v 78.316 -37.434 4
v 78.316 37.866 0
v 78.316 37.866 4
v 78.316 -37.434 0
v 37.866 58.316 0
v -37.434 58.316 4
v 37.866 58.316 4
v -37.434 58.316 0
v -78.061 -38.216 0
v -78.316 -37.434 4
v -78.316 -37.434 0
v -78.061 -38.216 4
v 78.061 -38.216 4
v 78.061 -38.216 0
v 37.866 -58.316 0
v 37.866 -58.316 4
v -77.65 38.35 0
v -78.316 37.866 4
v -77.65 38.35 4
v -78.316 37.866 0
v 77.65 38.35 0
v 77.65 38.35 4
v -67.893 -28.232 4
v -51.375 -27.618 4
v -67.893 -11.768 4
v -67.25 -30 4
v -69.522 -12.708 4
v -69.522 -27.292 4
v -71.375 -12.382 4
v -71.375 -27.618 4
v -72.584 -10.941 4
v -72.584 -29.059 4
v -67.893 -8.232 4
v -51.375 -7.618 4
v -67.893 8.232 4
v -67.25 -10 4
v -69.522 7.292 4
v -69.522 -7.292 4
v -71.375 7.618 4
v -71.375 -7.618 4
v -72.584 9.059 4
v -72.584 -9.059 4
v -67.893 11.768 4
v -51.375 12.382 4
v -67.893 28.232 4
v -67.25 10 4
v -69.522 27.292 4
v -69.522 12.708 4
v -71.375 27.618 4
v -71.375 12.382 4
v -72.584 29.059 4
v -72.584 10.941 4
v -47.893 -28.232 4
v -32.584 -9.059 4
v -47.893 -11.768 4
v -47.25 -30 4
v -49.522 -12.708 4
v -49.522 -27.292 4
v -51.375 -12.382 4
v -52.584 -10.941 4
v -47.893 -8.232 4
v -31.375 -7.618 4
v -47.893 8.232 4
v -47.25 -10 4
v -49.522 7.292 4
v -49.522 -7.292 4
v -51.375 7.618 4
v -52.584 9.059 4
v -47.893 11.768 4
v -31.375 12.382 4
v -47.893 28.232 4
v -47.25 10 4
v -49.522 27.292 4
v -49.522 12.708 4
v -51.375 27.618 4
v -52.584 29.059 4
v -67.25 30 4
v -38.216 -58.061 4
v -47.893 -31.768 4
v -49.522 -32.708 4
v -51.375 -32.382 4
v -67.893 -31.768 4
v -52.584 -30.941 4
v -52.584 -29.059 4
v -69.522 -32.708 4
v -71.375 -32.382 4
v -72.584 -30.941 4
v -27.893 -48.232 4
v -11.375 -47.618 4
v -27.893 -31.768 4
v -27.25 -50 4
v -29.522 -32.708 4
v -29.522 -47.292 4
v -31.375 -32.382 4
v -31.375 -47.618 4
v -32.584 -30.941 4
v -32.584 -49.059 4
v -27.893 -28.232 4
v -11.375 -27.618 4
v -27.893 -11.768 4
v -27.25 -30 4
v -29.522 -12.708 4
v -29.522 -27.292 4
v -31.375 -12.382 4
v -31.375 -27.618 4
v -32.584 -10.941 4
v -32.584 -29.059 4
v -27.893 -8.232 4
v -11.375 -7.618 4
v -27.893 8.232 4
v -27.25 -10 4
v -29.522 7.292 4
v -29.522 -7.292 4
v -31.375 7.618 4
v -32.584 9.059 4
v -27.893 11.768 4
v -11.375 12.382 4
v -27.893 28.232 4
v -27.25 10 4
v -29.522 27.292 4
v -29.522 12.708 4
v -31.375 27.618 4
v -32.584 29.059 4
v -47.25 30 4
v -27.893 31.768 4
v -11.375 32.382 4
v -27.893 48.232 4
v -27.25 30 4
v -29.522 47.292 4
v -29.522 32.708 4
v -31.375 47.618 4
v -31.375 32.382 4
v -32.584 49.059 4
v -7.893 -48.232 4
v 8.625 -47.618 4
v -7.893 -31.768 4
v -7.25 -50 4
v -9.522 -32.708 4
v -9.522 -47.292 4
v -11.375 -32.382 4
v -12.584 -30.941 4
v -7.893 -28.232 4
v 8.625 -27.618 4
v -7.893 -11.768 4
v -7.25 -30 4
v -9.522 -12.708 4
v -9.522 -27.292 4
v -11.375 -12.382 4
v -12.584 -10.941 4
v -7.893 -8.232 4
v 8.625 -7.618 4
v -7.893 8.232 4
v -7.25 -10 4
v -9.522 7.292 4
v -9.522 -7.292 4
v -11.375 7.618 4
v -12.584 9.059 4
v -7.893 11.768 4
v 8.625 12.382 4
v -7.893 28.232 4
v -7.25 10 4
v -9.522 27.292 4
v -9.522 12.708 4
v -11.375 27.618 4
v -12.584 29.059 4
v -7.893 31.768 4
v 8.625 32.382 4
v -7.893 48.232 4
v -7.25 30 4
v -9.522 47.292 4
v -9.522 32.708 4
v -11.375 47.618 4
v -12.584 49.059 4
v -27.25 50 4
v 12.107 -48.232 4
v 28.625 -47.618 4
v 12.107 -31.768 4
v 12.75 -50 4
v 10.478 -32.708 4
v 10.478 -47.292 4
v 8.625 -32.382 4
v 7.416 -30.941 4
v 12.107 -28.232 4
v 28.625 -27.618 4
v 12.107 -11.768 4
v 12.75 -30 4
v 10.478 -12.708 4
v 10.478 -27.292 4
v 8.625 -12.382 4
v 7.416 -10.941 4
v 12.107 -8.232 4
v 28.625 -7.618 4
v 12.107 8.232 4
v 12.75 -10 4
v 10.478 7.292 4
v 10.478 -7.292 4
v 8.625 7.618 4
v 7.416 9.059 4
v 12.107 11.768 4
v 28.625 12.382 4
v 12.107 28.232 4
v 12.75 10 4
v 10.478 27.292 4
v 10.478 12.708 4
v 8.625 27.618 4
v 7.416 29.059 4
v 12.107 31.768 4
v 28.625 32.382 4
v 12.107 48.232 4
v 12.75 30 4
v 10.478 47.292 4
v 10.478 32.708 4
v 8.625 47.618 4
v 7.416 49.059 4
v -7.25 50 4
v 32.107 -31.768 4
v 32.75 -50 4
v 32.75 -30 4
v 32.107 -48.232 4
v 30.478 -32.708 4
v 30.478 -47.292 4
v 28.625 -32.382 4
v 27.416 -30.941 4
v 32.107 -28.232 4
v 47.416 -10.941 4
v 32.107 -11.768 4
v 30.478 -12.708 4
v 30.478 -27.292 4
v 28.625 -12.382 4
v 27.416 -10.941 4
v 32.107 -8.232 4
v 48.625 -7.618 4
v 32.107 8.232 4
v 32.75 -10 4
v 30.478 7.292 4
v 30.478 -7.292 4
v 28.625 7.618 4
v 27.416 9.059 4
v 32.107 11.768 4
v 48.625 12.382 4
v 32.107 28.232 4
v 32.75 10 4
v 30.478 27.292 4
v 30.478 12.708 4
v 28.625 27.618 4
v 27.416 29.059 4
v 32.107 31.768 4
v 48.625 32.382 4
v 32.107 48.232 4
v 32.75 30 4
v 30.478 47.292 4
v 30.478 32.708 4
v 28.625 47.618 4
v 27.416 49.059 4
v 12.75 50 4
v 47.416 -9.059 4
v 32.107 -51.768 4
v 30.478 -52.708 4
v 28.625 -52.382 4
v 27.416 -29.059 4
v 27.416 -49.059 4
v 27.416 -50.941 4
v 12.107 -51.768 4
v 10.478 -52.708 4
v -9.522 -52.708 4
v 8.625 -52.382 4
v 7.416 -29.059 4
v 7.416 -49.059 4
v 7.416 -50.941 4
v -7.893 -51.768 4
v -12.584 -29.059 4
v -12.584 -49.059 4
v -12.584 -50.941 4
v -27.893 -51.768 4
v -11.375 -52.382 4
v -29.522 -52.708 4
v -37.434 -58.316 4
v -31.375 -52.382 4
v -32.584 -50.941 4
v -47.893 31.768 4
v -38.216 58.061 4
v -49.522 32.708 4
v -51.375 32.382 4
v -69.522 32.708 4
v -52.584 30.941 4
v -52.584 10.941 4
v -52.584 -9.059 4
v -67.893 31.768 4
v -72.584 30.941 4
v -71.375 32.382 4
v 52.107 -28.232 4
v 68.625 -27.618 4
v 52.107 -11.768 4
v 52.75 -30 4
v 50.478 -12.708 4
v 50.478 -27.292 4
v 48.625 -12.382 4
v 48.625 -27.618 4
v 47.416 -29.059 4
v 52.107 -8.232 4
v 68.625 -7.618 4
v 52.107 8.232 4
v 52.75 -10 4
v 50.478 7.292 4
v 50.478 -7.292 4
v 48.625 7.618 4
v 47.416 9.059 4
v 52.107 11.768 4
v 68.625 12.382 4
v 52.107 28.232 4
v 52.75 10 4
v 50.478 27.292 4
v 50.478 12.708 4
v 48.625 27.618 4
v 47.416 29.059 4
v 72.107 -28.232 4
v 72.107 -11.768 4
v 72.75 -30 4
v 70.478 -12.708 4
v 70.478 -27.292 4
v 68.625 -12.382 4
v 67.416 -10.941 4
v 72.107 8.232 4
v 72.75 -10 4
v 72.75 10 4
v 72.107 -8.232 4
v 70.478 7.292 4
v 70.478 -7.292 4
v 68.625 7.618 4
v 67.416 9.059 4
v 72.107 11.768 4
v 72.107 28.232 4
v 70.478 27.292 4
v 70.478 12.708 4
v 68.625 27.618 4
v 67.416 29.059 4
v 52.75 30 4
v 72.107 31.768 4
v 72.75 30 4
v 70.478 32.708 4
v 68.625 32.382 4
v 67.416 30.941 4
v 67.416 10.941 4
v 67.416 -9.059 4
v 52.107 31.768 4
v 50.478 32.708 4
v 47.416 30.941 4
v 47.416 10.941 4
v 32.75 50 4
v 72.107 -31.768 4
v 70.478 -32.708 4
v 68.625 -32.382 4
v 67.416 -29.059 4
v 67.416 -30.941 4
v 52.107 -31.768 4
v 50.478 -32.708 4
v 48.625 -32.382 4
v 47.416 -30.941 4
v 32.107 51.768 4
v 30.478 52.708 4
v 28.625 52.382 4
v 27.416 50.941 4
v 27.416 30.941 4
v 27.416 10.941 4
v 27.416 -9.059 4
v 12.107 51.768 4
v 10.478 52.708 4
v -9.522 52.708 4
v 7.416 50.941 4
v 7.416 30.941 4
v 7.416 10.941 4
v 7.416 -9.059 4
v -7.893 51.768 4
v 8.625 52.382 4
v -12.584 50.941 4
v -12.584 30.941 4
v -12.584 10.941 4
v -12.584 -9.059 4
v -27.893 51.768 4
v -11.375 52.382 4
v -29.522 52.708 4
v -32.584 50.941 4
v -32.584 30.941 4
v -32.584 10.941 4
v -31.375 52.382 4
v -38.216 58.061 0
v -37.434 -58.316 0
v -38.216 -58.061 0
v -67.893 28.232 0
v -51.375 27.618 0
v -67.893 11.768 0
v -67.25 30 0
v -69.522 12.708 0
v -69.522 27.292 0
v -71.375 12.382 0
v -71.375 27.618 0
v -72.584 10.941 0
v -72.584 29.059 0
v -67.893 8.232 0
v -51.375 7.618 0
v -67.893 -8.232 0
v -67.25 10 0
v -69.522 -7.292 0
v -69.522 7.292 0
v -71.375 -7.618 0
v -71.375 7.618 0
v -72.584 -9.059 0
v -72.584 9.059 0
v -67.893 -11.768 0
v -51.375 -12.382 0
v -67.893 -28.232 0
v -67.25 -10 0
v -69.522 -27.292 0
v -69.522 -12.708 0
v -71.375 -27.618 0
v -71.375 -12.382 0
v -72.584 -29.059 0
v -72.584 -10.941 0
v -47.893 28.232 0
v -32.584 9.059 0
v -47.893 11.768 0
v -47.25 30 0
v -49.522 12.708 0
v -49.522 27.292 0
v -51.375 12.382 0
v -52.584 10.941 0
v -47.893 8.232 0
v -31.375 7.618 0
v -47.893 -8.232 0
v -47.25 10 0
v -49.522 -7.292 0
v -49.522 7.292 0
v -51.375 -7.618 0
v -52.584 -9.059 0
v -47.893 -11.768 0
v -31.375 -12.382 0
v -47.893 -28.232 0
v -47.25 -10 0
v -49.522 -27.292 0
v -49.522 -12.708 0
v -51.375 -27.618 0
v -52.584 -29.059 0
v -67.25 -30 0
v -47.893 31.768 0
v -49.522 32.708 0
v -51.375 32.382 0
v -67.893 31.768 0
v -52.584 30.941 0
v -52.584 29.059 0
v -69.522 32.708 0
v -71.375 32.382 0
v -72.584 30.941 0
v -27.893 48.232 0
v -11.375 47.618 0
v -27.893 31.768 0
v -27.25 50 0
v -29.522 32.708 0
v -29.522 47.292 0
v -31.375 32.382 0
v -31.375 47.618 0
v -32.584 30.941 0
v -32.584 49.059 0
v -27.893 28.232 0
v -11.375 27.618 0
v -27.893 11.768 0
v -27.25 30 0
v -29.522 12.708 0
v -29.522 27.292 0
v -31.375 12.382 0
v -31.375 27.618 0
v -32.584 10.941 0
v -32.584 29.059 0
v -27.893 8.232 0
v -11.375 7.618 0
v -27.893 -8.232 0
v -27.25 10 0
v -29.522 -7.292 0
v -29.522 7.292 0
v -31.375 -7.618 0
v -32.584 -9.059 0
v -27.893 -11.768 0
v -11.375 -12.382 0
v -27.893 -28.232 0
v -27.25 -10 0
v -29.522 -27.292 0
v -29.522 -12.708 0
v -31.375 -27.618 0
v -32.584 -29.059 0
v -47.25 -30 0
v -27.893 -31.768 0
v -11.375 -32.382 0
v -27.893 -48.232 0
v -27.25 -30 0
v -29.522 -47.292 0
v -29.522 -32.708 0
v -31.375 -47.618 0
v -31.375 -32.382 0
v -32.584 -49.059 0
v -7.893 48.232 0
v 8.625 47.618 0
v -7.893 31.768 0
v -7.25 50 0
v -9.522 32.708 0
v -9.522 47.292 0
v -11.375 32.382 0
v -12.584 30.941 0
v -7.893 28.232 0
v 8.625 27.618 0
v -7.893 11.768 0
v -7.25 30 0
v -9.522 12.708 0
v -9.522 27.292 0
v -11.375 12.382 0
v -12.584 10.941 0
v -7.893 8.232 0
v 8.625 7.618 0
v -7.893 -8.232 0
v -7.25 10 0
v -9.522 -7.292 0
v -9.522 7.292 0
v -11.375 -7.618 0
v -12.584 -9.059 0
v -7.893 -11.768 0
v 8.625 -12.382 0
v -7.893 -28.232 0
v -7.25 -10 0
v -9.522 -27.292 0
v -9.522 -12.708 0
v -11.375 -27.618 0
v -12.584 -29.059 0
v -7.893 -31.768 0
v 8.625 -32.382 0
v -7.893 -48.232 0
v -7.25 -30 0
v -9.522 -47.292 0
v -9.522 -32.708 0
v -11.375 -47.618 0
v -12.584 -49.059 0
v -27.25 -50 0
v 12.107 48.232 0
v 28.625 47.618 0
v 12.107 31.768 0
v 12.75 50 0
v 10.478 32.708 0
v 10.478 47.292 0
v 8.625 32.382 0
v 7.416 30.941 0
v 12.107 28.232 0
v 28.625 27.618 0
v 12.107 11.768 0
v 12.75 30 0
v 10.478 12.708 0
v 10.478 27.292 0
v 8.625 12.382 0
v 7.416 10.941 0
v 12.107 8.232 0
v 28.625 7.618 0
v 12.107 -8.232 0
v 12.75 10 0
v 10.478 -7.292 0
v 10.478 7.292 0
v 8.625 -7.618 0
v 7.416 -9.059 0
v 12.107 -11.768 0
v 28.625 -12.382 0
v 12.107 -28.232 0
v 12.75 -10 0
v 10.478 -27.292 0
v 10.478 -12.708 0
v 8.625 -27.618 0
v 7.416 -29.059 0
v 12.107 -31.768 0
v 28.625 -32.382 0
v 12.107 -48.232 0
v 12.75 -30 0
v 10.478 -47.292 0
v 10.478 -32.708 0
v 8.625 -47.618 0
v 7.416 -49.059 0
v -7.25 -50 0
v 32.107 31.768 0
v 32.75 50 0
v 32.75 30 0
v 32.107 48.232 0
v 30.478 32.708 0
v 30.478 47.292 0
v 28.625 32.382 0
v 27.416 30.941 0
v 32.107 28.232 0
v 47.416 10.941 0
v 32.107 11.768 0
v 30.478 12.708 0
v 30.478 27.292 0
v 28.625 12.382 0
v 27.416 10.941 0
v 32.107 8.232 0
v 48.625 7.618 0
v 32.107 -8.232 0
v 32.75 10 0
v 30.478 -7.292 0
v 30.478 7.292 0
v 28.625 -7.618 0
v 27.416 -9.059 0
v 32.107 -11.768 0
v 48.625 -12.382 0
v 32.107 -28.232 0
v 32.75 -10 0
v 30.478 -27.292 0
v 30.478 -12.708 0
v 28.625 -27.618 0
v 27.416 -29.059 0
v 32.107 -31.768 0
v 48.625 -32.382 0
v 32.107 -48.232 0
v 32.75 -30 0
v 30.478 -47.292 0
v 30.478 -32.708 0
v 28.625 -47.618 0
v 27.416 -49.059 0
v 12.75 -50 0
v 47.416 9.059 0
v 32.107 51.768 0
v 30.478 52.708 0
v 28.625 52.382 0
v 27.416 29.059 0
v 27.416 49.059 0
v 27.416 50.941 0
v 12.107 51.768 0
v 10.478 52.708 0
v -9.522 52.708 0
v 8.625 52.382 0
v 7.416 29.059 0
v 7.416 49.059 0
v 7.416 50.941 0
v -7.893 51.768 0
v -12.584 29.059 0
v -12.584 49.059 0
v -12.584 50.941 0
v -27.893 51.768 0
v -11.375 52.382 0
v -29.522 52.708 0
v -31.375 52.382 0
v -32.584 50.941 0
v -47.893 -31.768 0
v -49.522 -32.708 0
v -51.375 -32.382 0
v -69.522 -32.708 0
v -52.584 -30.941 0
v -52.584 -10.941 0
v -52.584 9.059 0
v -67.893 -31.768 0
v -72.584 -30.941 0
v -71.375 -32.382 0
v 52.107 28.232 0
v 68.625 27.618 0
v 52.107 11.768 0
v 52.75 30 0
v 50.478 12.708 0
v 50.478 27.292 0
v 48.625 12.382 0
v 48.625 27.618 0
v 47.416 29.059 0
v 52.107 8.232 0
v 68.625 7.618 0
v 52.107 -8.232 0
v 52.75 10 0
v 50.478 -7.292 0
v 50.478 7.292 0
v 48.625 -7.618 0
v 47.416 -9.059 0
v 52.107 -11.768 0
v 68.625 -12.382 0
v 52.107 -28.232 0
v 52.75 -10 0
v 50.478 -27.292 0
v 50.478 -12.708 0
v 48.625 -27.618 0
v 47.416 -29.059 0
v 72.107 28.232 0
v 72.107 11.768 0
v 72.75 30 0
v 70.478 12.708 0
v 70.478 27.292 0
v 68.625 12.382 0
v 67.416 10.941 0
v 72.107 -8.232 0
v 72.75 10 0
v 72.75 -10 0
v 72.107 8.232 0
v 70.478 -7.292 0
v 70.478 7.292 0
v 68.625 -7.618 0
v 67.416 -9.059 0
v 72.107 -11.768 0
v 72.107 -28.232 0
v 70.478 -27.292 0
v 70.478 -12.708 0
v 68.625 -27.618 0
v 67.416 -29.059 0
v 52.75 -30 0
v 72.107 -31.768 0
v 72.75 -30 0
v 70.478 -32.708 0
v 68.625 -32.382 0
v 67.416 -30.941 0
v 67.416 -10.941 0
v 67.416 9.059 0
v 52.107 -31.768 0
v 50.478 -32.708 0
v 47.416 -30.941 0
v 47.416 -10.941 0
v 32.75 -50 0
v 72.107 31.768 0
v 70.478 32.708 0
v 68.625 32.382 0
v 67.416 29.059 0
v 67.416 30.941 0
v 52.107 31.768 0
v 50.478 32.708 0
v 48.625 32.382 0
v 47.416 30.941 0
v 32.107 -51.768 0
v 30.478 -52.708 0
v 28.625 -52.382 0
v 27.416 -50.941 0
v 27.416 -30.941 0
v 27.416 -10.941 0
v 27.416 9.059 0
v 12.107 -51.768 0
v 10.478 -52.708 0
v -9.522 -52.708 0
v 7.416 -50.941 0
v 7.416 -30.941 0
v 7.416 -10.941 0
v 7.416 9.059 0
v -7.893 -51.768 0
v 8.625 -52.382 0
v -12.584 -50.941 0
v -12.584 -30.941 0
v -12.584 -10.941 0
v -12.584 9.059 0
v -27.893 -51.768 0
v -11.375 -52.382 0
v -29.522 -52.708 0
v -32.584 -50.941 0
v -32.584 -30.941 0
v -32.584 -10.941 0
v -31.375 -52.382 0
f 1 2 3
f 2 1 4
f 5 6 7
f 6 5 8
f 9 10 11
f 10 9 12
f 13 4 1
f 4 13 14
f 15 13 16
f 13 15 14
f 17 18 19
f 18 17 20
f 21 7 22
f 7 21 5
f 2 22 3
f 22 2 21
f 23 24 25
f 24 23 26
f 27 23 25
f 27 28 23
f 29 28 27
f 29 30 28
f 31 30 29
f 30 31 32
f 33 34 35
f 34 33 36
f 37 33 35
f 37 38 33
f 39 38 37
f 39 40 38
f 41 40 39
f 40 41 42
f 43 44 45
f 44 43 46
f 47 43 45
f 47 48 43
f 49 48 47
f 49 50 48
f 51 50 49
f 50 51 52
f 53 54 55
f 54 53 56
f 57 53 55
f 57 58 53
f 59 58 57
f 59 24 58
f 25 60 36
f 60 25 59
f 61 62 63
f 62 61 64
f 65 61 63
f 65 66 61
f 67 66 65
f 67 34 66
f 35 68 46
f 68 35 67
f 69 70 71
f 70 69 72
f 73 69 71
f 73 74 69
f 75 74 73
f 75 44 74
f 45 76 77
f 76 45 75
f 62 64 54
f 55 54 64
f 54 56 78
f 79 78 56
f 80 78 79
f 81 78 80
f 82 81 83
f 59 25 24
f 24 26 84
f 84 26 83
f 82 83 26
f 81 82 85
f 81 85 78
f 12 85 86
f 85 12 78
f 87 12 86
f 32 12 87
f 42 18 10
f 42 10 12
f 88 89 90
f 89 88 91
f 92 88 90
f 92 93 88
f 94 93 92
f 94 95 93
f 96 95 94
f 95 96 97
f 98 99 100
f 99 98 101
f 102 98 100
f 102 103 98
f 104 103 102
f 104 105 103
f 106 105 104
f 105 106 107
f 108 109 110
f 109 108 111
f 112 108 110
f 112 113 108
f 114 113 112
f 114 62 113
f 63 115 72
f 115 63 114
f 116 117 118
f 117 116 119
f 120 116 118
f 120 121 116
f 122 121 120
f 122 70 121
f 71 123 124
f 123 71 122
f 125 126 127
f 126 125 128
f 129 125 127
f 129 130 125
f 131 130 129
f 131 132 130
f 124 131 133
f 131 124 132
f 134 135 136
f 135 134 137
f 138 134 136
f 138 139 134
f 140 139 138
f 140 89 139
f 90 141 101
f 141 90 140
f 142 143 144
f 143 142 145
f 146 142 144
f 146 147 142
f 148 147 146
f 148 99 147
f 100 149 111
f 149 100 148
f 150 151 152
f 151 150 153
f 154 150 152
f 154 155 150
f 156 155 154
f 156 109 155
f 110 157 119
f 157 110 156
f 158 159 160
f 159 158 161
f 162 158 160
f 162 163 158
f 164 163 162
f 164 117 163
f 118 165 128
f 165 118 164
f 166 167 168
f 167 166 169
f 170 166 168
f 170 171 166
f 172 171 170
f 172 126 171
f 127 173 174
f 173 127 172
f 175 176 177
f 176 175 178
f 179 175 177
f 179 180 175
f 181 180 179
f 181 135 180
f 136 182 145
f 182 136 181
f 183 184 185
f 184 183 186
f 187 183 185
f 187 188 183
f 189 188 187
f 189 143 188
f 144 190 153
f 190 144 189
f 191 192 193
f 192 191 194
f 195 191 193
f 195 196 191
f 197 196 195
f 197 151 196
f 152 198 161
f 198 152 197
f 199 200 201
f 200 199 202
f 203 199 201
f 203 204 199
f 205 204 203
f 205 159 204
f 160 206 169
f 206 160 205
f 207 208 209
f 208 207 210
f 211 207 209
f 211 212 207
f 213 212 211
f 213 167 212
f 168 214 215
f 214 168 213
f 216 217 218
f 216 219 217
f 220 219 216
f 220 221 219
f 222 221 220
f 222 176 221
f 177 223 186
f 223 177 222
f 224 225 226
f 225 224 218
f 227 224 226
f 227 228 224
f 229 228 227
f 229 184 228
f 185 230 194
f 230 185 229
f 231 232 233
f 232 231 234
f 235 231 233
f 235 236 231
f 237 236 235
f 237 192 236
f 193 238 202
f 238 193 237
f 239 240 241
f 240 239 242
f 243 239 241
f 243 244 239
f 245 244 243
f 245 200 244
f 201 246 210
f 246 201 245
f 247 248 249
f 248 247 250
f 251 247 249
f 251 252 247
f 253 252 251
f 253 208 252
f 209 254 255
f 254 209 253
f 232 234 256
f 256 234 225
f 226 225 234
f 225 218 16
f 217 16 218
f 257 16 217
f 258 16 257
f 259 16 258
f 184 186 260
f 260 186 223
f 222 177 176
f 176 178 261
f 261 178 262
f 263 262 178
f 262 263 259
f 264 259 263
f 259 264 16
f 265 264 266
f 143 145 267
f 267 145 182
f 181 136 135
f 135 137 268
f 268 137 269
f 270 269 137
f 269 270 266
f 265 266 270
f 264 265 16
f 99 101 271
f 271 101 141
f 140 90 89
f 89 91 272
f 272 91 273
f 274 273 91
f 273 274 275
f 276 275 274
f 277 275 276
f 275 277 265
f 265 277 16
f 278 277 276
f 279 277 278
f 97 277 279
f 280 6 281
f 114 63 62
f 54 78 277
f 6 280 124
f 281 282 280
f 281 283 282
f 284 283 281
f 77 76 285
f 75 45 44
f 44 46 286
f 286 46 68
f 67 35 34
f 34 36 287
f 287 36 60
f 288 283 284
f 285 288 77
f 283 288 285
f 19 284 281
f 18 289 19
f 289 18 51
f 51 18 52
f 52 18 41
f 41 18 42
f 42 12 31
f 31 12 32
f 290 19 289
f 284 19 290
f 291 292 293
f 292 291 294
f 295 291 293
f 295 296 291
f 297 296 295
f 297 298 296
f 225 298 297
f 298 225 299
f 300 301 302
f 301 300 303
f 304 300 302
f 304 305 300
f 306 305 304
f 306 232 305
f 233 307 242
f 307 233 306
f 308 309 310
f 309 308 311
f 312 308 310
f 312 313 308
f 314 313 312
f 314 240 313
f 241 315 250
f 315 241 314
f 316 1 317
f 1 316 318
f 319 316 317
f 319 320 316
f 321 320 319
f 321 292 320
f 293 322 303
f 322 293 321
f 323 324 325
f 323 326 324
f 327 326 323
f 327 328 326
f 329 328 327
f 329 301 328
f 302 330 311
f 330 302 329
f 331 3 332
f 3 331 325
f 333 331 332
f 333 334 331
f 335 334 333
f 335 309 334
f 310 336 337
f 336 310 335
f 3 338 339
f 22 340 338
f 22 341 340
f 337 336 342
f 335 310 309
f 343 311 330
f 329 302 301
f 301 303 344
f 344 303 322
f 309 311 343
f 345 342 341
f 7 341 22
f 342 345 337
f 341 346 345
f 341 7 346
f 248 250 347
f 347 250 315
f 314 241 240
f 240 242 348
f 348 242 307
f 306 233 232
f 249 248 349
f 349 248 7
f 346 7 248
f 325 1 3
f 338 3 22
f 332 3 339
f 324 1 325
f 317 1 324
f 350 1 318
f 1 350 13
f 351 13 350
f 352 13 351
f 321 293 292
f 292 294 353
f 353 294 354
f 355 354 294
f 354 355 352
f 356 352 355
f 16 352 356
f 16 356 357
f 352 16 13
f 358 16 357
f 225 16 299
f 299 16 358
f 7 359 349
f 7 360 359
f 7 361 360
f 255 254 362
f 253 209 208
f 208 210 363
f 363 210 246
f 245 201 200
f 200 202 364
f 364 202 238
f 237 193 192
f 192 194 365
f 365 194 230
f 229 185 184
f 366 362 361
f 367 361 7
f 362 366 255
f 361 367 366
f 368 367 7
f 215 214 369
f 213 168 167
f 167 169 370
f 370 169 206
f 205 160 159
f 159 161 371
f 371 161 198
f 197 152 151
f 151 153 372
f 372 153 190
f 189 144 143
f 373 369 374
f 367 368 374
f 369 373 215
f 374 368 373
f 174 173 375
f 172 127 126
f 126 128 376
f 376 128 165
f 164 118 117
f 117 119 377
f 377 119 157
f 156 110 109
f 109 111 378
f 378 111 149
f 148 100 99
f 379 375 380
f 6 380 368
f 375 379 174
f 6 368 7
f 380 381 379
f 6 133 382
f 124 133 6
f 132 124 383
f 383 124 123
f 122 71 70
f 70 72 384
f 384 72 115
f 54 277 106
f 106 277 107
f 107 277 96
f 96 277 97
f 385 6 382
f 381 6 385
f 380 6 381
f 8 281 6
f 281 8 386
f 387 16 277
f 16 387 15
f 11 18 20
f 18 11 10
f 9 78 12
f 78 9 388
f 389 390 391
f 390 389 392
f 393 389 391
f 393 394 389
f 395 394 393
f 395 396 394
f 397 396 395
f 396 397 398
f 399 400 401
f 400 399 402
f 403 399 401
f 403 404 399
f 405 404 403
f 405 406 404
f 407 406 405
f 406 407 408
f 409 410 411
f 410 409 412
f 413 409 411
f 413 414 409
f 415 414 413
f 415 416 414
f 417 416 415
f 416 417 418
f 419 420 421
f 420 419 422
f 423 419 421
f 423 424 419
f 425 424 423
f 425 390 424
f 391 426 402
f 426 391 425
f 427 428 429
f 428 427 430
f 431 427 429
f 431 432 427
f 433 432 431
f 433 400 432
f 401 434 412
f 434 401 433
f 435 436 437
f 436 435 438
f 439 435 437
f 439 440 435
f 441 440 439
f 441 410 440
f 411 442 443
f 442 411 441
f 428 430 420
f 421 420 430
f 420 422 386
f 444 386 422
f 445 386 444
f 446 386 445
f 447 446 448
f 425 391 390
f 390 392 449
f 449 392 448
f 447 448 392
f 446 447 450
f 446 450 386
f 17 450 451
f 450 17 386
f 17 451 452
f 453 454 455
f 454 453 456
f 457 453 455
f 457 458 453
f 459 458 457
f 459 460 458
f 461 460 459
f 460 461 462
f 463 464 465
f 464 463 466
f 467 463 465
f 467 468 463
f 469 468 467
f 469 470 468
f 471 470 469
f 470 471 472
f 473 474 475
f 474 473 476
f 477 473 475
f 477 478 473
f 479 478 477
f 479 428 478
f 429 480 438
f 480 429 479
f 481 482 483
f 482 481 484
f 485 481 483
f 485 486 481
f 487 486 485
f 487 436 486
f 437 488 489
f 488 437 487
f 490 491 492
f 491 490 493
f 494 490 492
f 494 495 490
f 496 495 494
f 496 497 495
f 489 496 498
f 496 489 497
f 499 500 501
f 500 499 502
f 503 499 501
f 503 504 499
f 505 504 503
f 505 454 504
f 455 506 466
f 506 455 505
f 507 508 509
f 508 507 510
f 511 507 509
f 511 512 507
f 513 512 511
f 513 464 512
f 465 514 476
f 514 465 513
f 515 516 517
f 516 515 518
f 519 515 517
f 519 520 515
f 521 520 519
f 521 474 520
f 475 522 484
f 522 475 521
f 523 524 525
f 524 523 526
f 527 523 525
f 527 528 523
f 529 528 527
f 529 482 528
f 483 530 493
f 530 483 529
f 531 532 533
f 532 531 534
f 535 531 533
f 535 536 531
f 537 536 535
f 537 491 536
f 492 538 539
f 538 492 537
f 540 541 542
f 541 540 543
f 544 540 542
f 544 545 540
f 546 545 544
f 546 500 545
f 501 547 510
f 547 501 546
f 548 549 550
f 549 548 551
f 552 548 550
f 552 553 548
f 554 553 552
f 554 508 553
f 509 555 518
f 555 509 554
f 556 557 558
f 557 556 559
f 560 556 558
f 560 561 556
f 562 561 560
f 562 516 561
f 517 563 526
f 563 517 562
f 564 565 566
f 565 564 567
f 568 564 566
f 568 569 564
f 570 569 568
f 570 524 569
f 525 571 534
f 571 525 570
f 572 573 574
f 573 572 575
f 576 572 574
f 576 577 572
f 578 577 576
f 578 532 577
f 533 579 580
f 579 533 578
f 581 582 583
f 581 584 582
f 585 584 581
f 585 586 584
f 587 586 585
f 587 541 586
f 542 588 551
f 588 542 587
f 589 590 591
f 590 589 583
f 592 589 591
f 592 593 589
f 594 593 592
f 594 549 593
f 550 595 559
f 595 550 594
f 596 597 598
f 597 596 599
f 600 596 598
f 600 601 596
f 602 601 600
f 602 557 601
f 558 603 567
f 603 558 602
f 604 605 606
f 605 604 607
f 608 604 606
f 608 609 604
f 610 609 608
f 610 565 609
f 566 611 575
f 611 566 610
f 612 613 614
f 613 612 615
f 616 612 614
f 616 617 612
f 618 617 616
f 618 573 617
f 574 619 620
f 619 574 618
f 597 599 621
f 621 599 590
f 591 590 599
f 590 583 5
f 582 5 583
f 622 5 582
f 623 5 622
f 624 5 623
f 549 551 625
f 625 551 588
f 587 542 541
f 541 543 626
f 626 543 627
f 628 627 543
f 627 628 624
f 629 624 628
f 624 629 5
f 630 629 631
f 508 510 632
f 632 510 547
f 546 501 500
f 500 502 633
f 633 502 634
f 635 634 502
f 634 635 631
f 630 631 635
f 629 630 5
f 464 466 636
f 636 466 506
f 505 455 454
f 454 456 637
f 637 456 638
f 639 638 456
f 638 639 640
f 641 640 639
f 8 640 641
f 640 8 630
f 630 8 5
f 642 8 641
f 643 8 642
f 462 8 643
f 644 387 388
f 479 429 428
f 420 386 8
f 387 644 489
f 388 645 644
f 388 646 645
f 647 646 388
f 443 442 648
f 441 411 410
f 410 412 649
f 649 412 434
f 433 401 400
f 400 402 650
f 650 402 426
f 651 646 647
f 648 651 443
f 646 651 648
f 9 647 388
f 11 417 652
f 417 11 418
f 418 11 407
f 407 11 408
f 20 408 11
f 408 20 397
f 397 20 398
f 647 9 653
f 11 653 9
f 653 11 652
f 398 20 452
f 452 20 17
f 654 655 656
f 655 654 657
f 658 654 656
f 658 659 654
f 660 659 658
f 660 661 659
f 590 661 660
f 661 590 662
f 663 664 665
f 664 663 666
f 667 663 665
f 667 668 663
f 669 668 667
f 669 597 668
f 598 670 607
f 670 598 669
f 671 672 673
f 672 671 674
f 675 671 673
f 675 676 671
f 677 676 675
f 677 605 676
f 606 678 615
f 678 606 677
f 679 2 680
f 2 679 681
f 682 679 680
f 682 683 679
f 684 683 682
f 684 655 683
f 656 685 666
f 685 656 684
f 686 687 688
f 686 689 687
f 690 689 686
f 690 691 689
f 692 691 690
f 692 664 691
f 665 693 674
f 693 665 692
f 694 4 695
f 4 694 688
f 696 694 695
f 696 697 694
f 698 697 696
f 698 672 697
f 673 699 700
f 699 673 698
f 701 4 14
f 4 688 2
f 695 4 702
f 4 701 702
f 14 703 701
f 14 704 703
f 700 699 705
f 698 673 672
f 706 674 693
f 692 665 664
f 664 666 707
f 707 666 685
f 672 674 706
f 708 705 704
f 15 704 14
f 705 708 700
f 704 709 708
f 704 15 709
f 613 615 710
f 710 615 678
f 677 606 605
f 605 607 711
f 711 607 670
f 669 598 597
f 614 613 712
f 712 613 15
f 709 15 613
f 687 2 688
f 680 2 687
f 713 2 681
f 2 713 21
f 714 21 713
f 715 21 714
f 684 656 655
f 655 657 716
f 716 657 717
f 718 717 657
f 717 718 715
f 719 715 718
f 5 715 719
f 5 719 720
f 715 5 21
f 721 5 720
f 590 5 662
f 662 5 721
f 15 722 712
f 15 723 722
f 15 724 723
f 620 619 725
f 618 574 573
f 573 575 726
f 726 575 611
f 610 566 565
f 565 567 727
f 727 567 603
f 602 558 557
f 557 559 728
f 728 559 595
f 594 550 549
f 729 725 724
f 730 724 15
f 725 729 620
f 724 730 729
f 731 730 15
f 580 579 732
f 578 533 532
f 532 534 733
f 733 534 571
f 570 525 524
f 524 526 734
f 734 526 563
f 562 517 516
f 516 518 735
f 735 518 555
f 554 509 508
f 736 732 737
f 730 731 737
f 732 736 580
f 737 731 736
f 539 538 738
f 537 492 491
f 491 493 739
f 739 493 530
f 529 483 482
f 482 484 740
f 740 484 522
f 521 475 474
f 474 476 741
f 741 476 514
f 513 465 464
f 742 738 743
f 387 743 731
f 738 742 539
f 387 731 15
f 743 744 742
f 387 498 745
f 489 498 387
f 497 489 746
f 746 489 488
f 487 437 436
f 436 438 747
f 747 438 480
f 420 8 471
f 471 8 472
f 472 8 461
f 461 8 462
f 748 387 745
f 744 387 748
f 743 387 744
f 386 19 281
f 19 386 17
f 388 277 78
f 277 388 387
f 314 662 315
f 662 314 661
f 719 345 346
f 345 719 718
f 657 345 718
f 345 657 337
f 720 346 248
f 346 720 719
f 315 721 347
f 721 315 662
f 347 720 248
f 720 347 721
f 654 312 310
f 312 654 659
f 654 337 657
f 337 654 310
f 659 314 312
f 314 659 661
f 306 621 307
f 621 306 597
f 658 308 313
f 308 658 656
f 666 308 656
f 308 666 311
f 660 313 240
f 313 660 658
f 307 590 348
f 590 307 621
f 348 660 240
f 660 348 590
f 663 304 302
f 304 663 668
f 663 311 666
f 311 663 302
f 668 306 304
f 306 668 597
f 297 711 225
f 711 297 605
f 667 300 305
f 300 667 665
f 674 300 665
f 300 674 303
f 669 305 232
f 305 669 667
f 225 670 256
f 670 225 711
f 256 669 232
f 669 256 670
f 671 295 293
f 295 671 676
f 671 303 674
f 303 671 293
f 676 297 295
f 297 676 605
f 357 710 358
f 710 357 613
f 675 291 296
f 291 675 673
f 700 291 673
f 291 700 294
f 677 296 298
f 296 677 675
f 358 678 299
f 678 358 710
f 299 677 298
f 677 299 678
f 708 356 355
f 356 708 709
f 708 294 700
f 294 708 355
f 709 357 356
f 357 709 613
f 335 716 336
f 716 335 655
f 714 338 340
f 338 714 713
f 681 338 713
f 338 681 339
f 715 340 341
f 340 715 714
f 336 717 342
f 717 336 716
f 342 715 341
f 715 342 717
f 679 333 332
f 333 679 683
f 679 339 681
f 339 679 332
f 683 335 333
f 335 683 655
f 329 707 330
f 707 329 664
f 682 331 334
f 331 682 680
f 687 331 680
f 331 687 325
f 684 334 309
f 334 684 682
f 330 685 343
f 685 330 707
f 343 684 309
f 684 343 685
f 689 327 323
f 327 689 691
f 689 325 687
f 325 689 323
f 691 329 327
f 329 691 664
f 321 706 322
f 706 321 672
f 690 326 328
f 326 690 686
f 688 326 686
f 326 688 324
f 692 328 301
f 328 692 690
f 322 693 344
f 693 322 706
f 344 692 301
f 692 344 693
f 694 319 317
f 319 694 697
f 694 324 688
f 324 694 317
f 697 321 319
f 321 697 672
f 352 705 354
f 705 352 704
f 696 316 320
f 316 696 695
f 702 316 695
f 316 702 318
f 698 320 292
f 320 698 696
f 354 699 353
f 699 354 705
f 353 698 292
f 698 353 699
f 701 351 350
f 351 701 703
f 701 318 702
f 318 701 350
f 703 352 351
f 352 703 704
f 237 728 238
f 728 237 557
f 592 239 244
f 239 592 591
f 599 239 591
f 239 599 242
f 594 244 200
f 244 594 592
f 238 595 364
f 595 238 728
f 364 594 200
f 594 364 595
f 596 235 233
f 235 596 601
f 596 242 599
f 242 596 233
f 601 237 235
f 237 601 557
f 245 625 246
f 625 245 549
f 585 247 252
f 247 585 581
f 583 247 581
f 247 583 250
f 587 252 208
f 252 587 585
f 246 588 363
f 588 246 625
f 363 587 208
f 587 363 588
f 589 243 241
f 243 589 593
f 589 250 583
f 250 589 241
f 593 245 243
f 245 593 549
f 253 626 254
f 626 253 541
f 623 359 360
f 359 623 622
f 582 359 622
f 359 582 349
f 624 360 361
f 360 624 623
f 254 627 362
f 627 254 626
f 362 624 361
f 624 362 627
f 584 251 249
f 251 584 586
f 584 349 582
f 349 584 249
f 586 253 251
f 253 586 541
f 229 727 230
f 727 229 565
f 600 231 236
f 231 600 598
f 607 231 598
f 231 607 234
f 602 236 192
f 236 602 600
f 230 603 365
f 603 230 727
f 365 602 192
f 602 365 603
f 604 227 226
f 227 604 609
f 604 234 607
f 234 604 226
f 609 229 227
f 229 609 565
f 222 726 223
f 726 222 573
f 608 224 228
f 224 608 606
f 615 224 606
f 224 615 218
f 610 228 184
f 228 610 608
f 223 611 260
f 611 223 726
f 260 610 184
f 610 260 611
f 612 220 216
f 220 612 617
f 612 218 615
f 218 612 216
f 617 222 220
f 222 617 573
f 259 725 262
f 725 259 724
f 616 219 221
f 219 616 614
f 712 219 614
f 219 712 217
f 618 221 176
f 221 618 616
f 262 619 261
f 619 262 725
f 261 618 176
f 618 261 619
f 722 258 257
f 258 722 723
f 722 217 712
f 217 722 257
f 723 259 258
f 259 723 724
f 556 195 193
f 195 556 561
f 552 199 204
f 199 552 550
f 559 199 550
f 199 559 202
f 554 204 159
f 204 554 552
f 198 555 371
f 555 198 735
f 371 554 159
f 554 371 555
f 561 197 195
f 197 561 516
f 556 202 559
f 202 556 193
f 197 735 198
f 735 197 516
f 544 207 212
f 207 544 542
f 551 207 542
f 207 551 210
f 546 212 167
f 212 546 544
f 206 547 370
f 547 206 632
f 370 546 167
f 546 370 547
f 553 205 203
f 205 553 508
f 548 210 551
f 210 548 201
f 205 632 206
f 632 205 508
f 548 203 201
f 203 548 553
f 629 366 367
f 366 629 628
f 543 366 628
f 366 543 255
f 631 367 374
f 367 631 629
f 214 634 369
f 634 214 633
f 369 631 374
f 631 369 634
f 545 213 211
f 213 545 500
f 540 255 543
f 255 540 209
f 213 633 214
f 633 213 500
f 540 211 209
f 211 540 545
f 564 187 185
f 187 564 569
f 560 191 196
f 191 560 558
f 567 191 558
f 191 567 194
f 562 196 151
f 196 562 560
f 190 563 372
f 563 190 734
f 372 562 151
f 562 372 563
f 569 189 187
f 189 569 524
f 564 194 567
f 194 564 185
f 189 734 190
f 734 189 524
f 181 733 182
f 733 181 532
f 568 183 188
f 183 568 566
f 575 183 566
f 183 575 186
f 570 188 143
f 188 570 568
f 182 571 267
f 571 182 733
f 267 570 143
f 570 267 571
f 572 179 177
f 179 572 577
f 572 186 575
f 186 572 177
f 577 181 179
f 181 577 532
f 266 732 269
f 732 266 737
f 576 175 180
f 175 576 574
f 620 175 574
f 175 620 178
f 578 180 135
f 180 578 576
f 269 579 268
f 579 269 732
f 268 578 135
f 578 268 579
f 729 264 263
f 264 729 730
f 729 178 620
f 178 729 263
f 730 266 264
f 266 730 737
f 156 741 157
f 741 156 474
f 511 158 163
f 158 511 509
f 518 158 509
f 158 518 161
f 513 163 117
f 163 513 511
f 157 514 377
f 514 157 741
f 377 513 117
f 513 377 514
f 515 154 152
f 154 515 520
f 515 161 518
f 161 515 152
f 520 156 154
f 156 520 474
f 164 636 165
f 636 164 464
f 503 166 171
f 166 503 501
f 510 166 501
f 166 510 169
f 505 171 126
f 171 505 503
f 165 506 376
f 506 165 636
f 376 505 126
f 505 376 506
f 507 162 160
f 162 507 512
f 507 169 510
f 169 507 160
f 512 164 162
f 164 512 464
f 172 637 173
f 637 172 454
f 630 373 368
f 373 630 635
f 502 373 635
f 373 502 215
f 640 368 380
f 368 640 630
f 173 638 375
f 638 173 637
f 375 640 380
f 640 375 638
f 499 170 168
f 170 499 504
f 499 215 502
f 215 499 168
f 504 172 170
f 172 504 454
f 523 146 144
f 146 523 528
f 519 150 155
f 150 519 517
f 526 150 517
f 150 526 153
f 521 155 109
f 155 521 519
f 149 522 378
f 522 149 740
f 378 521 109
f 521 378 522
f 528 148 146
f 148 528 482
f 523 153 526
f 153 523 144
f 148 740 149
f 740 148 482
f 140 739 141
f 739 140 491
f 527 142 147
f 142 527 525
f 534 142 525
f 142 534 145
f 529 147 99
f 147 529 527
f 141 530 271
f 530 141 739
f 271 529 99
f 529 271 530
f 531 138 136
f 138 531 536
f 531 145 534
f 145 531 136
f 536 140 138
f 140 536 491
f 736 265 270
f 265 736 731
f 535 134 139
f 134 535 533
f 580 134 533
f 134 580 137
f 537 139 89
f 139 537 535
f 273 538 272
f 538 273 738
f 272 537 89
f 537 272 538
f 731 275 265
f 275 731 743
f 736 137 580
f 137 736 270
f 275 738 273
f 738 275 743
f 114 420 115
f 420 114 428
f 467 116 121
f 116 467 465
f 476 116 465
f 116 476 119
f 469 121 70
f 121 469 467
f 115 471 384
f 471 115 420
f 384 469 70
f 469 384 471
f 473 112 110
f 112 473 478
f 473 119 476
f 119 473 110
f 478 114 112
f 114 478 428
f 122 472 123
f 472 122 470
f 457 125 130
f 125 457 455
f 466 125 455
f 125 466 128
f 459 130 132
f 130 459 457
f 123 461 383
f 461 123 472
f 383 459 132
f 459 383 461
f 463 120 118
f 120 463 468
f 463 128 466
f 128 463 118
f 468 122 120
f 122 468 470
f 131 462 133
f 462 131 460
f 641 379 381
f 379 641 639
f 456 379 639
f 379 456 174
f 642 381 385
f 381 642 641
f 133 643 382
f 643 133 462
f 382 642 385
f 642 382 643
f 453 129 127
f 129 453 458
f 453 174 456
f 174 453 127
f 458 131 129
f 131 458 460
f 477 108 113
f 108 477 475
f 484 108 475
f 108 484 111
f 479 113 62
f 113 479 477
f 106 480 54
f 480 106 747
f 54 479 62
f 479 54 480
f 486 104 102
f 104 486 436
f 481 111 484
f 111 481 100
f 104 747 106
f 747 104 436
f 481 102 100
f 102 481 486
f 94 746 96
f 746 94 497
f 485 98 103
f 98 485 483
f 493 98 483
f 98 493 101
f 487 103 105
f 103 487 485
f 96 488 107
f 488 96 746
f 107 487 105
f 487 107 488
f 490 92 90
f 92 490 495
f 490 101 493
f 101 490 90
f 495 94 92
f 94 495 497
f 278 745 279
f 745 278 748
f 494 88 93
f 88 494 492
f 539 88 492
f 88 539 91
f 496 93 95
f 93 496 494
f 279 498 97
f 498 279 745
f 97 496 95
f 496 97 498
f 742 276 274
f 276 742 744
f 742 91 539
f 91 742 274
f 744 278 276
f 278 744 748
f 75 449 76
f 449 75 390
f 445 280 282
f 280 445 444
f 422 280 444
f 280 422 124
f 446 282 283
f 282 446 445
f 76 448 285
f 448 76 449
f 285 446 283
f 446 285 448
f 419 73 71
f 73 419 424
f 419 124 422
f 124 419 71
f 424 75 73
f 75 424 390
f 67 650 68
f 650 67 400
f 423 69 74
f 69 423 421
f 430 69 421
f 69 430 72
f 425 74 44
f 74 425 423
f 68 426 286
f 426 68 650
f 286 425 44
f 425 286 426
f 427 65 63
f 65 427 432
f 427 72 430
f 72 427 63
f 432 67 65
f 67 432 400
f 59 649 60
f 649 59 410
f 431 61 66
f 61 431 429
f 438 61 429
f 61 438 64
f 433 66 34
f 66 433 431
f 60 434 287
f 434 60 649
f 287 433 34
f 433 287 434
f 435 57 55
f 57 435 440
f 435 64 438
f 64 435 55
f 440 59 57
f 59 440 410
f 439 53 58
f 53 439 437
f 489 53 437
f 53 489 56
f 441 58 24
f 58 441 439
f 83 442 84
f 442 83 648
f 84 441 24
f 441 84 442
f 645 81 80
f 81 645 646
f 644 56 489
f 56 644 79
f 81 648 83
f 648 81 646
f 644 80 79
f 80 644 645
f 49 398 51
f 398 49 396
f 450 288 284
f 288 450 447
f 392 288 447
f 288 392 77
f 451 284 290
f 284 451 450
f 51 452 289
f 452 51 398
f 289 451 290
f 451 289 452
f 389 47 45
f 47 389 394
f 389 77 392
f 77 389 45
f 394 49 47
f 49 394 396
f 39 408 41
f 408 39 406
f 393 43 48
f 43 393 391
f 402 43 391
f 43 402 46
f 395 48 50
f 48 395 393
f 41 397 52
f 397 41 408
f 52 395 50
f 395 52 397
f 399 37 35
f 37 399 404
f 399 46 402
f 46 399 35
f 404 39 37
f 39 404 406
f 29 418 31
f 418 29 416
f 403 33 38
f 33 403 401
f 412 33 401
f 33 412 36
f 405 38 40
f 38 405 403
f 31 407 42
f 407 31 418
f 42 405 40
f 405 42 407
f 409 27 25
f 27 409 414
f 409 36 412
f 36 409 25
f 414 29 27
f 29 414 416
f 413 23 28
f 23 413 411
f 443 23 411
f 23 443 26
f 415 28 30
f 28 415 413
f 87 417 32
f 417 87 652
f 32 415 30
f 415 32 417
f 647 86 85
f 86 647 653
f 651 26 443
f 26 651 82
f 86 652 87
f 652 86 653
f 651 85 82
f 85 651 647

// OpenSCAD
// rob@openpart.co.uk 20140202-23:00
// 40 hole cross joining plate for 80mm NOMINAL extrusion
// V-Slot & others

module roundedRect(size, radius)
{
	x = size[0];
	y = size[1];
	z = size[2];
	linear_extrude(height=z)
	hull()
	{
		// place 4 circles in the corners, with the given radius
		translate([(-x/2)+(radius/2), (-y/2)+(radius/2), 0])
		circle(r=radius);
		translate([(x/2)-(radius/2), (-y/2)+(radius/2), 0])
		circle(r=radius);
		translate([(-x/2)+(radius/2), (y/2)-(radius/2), 0])
		circle(r=radius);
		translate([(x/2)-(radius/2), (y/2)-(radius/2), 0])
		circle(r=radius);
	}
}

hole = 5.5 / 2;
plate_width1 = 116;
plate_width2 = 156;
plate_length = 76;
plate_thickness = 4;
extend_past_thickness = 2;
corner_radius = 0.7;
difference () {
	hull () {
		translate([0, 0, 0])
			roundedRect ([plate_length, plate_width1, plate_thickness], corner_radius);
		rotate (90,0,0) {
			translate([0, 0, 0])
				roundedRect ([plate_length, plate_width2, plate_thickness], corner_radius);
		}
	}

	translate([50,30,-1])
		cylinder(h = (extend_past_thickness+plate_thickness+2), r = hole);
	translate([50,10,-1])
		cylinder(h = (extend_past_thickness+plate_thickness+2), r = hole);
	translate([50,-10,-1])
		cylinder(h = (extend_past_thickness+plate_thickness+2), r = hole);
	translate([50,-30,-1])
		cylinder(h = (extend_past_thickness+plate_thickness+2), r = hole);
	translate([70,30,-1])
		cylinder(h = (extend_past_thickness+plate_thickness+2), r = hole);
	translate([70,10,-1])
		cylinder(h = (extend_past_thickness+plate_thickness+2), r = hole);
	translate([70,-10,-1])
		cylinder(h = (extend_past_thickness+plate_thickness+2), r = hole);
	translate([70,-30,-1])
		cylinder(h = (extend_past_thickness+plate_thickness+2), r = hole);

	translate([30,10,-1])
		cylinder(h = (extend_past_thickness+plate_thickness+2), r = hole);
	translate([30,30,-1])
		cylinder(h = (extend_past_thickness+plate_thickness+2), r = hole);
	translate([30,50,-1])
		cylinder(h = (extend_past_thickness+plate_thickness+2), r = hole);
	translate([30,-10,-1])
		cylinder(h = (extend_past_thickness+plate_thickness+2), r = hole);
	translate([30,-30,-1])
		cylinder(h = (extend_past_thickness+plate_thickness+2), r = hole);
	translate([30,-50,-1])
		cylinder(h = (extend_past_thickness+plate_thickness+2), r = hole);

	translate([10,10,-1])
		cylinder(h = (extend_past_thickness+plate_thickness+2), r = hole);
	translate([10,30,-1])
		cylinder(h = (extend_past_thickness+plate_thickness+2), r = hole);
	translate([10,50,-1])
		cylinder(h = (extend_past_thickness+plate_thickness+2), r = hole);
	translate([10,-10,-1])
		cylinder(h = (extend_past_thickness+plate_thickness+2), r = hole);
	translate([10,-30,-1])
		cylinder(h = (extend_past_thickness+plate_thickness+2), r = hole);
	translate([10,-50,-1])
		cylinder(h = (extend_past_thickness+plate_thickness+2), r = hole);

	translate([-10,10,-1])
		cylinder(h = (extend_past_thickness+plate_thickness+2), r = hole);
	translate([-10,30,-1])
		cylinder(h = (extend_past_thickness+plate_thickness+2), r = hole);
	translate([-10,50,-1])
		cylinder(h = (extend_past_thickness+plate_thickness+2), r = hole);
	translate([-10,-10,-1])
		cylinder(h = (extend_past_thickness+plate_thickness+2), r = hole);
	translate([-10,-30,-1])
		cylinder(h = (extend_past_thickness+plate_thickness+2), r = hole);
	translate([-10,-50,-1])
		cylinder(h = (extend_past_thickness+plate_thickness+2), r = hole);

	translate([-30,10,-1])
		cylinder(h = (extend_past_thickness+plate_thickness+2), r = hole);
	translate([-30,30,-1])
		cylinder(h = (extend_past_thickness+plate_thickness+2), r = hole);
	translate([-30,50,-1])
		cylinder(h = (extend_past_thickness+plate_thickness+2), r = hole);
	translate([-30,-10,-1])
		cylinder(h = (extend_past_thickness+plate_thickness+2), r = hole);
	translate([-30,-30,-1])
		cylinder(h = (extend_past_thickness+plate_thickness+2), r = hole);
	translate([-30,-50,-1])
		cylinder(h = (extend_past_thickness+plate_thickness+2), r = hole);

	translate([-50,30,-1])
		cylinder(h = (extend_past_thickness+plate_thickness+2), r = hole);
	translate([-50,10,-1])
		cylinder(h = (extend_past_thickness+plate_thickness+2), r = hole);
	translate([-50,-10,-1])
		cylinder(h = (extend_past_thickness+plate_thickness+2), r = hole);
	translate([-50,-30,-1])
		cylinder(h = (extend_past_thickness+plate_thickness+2), r = hole);
	translate([-70,30,-1])
		cylinder(h = (extend_past_thickness+plate_thickness+2), r = hole);
	translate([-70,10,-1])
		cylinder(h = (extend_past_thickness+plate_thickness+2), r = hole);
	translate([-70,-10,-1])
		cylinder(h = (extend_past_thickness+plate_thickness+2), r = hole);
	translate([-70,-30,-1])
		cylinder(h = (extend_past_thickness+plate_thickness+2), r = hole);

}
	
